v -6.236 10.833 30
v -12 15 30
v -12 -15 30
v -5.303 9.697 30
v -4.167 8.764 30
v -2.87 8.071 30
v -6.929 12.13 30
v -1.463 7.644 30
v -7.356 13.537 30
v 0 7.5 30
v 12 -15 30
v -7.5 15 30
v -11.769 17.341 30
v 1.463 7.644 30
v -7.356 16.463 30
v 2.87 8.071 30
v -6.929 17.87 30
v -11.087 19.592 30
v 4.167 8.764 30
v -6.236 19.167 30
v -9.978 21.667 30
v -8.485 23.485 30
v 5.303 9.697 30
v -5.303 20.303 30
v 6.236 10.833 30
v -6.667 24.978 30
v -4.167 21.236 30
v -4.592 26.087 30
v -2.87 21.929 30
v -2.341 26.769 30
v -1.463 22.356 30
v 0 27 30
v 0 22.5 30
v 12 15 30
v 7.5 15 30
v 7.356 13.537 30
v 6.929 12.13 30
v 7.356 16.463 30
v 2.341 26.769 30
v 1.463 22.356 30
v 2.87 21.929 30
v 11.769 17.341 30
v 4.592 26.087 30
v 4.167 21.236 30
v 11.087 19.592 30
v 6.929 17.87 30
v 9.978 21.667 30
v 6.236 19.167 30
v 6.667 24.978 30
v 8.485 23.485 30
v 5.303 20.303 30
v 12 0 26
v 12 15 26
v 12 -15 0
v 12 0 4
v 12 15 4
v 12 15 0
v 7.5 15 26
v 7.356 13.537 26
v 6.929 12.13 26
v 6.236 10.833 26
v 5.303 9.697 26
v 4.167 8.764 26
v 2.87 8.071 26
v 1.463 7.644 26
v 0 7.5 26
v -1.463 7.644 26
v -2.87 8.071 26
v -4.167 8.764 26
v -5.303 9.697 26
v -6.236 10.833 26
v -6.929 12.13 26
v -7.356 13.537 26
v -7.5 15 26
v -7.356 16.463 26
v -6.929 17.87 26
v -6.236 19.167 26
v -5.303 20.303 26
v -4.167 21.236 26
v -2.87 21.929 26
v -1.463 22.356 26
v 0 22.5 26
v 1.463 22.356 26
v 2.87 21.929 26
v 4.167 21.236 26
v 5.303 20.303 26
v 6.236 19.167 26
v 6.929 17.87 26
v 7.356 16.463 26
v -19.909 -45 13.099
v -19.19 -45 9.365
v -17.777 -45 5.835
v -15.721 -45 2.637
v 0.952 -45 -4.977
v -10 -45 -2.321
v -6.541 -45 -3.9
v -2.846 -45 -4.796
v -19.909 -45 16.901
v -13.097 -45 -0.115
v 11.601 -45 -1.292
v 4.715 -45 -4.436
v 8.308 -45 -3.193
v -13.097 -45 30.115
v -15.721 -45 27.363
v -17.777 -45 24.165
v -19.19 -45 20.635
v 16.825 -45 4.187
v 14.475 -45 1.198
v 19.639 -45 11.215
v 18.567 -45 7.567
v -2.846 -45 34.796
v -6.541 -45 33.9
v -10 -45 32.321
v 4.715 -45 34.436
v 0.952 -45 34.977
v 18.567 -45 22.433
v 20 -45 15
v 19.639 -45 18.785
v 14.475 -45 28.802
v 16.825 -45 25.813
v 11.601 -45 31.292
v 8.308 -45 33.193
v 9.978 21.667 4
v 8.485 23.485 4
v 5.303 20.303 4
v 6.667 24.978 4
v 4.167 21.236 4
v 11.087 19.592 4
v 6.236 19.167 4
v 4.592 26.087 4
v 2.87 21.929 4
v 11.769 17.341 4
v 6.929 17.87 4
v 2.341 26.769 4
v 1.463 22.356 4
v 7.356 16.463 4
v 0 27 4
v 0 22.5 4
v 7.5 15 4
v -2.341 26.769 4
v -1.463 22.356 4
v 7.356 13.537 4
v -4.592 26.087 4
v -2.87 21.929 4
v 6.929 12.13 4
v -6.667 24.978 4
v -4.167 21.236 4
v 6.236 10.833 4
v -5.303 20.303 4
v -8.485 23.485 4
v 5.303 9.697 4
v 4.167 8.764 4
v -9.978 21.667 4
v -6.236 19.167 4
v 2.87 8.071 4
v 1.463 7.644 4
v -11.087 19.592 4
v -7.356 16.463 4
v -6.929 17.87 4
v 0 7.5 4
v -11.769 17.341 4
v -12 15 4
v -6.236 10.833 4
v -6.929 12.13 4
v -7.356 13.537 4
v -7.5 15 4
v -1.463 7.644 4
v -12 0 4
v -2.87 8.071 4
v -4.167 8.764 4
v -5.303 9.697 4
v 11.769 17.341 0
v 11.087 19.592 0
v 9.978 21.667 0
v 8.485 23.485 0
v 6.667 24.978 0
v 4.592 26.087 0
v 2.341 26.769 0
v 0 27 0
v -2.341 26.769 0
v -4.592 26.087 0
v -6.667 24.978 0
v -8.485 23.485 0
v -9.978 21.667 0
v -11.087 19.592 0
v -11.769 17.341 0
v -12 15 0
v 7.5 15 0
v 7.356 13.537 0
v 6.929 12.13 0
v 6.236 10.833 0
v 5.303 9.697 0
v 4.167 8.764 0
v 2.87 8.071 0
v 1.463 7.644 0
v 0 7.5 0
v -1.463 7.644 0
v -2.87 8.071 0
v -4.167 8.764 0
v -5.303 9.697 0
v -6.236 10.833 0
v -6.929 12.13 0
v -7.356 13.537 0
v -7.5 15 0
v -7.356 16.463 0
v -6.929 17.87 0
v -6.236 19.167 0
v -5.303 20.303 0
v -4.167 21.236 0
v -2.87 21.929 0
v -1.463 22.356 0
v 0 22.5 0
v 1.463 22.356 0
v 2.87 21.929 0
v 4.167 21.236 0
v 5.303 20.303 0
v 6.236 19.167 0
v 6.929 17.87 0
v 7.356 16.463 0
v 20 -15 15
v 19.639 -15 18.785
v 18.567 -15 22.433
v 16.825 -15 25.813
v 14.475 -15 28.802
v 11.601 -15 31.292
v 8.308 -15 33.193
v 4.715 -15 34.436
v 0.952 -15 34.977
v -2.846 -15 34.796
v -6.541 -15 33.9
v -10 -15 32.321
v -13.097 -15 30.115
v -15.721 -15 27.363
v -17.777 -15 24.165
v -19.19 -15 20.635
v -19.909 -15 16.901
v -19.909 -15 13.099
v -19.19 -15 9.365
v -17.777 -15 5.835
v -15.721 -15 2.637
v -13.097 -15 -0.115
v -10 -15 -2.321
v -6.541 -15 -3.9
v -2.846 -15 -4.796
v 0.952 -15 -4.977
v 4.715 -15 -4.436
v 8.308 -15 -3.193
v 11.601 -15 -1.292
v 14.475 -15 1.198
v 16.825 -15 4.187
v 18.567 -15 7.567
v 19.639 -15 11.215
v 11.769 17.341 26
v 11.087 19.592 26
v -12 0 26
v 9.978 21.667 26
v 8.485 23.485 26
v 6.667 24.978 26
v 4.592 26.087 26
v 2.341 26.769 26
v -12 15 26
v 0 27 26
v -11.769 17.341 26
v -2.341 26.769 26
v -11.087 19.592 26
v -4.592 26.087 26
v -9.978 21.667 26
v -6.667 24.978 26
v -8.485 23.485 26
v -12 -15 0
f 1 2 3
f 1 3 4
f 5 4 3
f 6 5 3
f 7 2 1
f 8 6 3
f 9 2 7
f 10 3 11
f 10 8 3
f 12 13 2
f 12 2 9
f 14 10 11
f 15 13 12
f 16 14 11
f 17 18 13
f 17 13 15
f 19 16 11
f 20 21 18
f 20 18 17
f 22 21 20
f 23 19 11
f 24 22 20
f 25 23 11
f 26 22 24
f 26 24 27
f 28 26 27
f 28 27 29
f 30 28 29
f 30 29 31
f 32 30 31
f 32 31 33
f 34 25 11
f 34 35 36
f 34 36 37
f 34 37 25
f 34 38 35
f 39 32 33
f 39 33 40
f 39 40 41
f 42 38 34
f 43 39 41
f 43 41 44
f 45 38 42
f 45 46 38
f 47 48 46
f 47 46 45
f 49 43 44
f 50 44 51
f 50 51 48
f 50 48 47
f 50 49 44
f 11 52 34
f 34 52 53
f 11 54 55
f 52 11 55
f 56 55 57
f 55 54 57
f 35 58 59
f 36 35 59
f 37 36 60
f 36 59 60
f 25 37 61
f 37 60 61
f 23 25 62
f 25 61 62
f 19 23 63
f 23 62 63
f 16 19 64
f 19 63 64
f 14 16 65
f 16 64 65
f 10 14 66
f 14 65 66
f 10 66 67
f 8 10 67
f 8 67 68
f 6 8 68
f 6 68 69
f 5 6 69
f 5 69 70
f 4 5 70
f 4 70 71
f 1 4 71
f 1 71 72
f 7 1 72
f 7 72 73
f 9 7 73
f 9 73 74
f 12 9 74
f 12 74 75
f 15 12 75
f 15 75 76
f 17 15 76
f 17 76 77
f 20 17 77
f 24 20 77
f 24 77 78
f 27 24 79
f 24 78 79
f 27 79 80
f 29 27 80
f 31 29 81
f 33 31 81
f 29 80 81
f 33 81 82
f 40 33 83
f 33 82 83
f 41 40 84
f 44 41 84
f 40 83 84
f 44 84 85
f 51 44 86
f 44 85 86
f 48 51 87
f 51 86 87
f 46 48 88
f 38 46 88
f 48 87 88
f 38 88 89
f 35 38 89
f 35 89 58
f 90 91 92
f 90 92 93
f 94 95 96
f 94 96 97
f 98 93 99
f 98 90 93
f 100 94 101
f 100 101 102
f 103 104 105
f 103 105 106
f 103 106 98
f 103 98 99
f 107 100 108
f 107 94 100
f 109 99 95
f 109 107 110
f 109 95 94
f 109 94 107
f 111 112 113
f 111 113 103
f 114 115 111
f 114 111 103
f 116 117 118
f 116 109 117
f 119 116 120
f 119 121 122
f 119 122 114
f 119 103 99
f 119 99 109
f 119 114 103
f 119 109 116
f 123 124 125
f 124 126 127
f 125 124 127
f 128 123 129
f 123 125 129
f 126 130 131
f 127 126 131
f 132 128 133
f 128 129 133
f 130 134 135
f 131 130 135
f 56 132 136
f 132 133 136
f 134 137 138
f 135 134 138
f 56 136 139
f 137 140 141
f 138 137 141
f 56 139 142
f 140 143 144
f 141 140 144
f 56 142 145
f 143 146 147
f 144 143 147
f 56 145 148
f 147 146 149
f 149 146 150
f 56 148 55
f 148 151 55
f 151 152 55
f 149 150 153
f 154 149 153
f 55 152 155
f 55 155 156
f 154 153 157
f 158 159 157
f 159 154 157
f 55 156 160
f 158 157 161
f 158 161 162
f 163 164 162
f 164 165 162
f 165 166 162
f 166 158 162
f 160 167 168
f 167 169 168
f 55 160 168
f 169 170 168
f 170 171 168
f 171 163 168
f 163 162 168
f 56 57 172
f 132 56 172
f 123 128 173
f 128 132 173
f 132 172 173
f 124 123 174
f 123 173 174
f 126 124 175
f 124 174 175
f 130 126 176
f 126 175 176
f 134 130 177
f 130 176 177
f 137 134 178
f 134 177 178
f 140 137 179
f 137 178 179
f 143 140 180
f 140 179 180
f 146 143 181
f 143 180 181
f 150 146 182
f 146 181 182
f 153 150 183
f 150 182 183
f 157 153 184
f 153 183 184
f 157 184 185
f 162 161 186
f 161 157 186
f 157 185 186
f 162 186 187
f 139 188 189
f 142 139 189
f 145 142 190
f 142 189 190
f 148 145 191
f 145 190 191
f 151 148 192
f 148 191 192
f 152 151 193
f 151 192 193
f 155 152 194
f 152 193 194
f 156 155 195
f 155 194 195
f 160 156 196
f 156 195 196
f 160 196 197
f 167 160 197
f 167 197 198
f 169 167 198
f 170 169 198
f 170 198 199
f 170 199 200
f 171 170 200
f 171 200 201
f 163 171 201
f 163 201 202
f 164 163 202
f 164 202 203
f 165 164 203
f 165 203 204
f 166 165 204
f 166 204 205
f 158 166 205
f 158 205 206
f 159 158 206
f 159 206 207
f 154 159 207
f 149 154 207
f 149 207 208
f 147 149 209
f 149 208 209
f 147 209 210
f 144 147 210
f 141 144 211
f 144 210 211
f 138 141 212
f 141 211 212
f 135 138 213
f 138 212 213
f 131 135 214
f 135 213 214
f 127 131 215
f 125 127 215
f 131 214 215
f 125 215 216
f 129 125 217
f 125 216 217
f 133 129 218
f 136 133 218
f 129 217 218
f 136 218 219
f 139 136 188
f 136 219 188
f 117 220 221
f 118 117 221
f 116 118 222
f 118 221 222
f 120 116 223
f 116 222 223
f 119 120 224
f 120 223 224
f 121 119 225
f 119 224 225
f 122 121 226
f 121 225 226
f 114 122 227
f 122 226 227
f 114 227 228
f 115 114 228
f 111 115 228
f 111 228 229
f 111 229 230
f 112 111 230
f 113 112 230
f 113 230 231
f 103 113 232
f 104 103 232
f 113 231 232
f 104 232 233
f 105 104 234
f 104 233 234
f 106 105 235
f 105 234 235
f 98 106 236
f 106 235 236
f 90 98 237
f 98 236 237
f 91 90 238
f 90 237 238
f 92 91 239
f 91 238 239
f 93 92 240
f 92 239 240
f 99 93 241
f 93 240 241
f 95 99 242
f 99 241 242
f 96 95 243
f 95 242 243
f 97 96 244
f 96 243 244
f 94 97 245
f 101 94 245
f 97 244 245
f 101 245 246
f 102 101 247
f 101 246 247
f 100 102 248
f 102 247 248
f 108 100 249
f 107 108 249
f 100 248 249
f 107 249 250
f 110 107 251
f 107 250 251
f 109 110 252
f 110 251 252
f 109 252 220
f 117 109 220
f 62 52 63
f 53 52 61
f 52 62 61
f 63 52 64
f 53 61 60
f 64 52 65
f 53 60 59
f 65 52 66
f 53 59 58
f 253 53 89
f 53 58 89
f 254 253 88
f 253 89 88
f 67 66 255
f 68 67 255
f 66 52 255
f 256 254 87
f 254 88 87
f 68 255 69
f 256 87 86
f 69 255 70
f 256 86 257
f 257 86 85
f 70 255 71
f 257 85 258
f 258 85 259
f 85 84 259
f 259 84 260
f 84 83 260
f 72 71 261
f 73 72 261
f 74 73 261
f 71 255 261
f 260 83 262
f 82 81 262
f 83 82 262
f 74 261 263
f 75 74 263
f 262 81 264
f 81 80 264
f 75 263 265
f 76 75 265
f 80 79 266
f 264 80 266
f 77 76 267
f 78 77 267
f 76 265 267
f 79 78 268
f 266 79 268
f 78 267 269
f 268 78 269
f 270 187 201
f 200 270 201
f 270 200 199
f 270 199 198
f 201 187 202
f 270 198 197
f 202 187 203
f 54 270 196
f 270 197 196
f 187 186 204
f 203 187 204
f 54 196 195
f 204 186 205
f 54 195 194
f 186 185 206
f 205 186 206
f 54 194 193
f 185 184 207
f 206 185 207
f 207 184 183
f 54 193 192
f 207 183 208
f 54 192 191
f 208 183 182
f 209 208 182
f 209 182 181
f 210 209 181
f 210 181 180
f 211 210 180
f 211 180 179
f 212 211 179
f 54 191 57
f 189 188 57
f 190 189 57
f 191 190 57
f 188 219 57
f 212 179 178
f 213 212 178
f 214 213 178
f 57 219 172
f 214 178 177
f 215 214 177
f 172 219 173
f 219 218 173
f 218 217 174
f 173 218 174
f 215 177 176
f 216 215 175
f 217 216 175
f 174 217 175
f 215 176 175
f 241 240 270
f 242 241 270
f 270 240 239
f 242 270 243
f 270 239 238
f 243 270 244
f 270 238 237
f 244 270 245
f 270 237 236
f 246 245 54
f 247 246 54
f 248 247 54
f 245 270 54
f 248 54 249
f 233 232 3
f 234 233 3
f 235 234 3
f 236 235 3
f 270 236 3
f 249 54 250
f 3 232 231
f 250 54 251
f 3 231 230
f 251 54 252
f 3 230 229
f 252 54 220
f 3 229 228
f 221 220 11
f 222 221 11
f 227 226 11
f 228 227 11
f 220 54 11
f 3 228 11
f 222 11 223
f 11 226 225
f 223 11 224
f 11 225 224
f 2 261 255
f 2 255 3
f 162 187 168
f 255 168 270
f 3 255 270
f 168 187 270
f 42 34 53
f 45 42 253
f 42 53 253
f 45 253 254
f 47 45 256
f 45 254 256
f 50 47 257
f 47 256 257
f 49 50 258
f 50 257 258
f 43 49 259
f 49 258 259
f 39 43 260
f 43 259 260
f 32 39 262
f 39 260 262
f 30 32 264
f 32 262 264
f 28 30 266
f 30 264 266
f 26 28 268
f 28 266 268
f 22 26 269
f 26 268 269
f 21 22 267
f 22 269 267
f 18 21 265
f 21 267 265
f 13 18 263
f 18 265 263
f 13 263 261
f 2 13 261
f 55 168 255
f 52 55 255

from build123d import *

# Parameters (mm, degrees)
F1_DEPTH = 30
F2_R     = 20
F2_W     = 24
F2_H     = 30
F3_DEPTH = 30
F4_W     = 15
F4_H     = 22
F5_DEPTH = 25.4


with BuildPart() as f1:
    # F0 (on Top) → F1 (new body)
    with BuildSketch(Plane.XY):
        with BuildLine():
            Line((7.5, 15), (12, 15))
            ThreePointArc((12, 15), (0, 27), (-12, 15))
            Line((-12, 15), (-7.5, 15))
            ThreePointArc((-7.5, 15), (0, 22.5), (7.5, 15))
        make_face()
        with BuildLine():
            ThreePointArc((-12, 15), (0, 3), (12, 15))
            Line((12, 15), (7.5, 15))
            ThreePointArc((7.5, 15), (0, 7.5), (-7.5, 15))
            Line((-7.5, 15), (-12, 15))
        make_face()
        with BuildLine():
            Line((12, -15), (12, 15))
            ThreePointArc((12, 15), (0, 3), (-12, 15))
            Line((-12, 15), (-12, -15))
            Line((-12, -15), (12, -15))
        make_face()
    extrude(amount=F1_DEPTH)

    # F2 (on face) → F3 (join)
    with BuildSketch(Plane.XZ.offset(15)):
        with Locations((0, 15)):
            Circle(F2_R)
        with Locations((0, 15)):
            Rectangle(F2_W, F2_H, mode=Mode.SUBTRACT)
        with Locations((0, 15)):
            Rectangle(F2_W, F2_H)
    extrude(amount=F3_DEPTH)

    # F4 (on face) → F5 (cut)
    with BuildSketch(Plane(origin=(-12, 0, 0), x_dir=(0, -1, 0), z_dir=(-1, 0, 0))):
        with Locations((-22.5, 15)):
            Rectangle(F4_W, F4_H)
        with Locations((-7.5, 15)):
            Rectangle(F4_W, F4_H)
    extrude(amount=-F5_DEPTH, mode=Mode.SUBTRACT)


solid = f1.part
